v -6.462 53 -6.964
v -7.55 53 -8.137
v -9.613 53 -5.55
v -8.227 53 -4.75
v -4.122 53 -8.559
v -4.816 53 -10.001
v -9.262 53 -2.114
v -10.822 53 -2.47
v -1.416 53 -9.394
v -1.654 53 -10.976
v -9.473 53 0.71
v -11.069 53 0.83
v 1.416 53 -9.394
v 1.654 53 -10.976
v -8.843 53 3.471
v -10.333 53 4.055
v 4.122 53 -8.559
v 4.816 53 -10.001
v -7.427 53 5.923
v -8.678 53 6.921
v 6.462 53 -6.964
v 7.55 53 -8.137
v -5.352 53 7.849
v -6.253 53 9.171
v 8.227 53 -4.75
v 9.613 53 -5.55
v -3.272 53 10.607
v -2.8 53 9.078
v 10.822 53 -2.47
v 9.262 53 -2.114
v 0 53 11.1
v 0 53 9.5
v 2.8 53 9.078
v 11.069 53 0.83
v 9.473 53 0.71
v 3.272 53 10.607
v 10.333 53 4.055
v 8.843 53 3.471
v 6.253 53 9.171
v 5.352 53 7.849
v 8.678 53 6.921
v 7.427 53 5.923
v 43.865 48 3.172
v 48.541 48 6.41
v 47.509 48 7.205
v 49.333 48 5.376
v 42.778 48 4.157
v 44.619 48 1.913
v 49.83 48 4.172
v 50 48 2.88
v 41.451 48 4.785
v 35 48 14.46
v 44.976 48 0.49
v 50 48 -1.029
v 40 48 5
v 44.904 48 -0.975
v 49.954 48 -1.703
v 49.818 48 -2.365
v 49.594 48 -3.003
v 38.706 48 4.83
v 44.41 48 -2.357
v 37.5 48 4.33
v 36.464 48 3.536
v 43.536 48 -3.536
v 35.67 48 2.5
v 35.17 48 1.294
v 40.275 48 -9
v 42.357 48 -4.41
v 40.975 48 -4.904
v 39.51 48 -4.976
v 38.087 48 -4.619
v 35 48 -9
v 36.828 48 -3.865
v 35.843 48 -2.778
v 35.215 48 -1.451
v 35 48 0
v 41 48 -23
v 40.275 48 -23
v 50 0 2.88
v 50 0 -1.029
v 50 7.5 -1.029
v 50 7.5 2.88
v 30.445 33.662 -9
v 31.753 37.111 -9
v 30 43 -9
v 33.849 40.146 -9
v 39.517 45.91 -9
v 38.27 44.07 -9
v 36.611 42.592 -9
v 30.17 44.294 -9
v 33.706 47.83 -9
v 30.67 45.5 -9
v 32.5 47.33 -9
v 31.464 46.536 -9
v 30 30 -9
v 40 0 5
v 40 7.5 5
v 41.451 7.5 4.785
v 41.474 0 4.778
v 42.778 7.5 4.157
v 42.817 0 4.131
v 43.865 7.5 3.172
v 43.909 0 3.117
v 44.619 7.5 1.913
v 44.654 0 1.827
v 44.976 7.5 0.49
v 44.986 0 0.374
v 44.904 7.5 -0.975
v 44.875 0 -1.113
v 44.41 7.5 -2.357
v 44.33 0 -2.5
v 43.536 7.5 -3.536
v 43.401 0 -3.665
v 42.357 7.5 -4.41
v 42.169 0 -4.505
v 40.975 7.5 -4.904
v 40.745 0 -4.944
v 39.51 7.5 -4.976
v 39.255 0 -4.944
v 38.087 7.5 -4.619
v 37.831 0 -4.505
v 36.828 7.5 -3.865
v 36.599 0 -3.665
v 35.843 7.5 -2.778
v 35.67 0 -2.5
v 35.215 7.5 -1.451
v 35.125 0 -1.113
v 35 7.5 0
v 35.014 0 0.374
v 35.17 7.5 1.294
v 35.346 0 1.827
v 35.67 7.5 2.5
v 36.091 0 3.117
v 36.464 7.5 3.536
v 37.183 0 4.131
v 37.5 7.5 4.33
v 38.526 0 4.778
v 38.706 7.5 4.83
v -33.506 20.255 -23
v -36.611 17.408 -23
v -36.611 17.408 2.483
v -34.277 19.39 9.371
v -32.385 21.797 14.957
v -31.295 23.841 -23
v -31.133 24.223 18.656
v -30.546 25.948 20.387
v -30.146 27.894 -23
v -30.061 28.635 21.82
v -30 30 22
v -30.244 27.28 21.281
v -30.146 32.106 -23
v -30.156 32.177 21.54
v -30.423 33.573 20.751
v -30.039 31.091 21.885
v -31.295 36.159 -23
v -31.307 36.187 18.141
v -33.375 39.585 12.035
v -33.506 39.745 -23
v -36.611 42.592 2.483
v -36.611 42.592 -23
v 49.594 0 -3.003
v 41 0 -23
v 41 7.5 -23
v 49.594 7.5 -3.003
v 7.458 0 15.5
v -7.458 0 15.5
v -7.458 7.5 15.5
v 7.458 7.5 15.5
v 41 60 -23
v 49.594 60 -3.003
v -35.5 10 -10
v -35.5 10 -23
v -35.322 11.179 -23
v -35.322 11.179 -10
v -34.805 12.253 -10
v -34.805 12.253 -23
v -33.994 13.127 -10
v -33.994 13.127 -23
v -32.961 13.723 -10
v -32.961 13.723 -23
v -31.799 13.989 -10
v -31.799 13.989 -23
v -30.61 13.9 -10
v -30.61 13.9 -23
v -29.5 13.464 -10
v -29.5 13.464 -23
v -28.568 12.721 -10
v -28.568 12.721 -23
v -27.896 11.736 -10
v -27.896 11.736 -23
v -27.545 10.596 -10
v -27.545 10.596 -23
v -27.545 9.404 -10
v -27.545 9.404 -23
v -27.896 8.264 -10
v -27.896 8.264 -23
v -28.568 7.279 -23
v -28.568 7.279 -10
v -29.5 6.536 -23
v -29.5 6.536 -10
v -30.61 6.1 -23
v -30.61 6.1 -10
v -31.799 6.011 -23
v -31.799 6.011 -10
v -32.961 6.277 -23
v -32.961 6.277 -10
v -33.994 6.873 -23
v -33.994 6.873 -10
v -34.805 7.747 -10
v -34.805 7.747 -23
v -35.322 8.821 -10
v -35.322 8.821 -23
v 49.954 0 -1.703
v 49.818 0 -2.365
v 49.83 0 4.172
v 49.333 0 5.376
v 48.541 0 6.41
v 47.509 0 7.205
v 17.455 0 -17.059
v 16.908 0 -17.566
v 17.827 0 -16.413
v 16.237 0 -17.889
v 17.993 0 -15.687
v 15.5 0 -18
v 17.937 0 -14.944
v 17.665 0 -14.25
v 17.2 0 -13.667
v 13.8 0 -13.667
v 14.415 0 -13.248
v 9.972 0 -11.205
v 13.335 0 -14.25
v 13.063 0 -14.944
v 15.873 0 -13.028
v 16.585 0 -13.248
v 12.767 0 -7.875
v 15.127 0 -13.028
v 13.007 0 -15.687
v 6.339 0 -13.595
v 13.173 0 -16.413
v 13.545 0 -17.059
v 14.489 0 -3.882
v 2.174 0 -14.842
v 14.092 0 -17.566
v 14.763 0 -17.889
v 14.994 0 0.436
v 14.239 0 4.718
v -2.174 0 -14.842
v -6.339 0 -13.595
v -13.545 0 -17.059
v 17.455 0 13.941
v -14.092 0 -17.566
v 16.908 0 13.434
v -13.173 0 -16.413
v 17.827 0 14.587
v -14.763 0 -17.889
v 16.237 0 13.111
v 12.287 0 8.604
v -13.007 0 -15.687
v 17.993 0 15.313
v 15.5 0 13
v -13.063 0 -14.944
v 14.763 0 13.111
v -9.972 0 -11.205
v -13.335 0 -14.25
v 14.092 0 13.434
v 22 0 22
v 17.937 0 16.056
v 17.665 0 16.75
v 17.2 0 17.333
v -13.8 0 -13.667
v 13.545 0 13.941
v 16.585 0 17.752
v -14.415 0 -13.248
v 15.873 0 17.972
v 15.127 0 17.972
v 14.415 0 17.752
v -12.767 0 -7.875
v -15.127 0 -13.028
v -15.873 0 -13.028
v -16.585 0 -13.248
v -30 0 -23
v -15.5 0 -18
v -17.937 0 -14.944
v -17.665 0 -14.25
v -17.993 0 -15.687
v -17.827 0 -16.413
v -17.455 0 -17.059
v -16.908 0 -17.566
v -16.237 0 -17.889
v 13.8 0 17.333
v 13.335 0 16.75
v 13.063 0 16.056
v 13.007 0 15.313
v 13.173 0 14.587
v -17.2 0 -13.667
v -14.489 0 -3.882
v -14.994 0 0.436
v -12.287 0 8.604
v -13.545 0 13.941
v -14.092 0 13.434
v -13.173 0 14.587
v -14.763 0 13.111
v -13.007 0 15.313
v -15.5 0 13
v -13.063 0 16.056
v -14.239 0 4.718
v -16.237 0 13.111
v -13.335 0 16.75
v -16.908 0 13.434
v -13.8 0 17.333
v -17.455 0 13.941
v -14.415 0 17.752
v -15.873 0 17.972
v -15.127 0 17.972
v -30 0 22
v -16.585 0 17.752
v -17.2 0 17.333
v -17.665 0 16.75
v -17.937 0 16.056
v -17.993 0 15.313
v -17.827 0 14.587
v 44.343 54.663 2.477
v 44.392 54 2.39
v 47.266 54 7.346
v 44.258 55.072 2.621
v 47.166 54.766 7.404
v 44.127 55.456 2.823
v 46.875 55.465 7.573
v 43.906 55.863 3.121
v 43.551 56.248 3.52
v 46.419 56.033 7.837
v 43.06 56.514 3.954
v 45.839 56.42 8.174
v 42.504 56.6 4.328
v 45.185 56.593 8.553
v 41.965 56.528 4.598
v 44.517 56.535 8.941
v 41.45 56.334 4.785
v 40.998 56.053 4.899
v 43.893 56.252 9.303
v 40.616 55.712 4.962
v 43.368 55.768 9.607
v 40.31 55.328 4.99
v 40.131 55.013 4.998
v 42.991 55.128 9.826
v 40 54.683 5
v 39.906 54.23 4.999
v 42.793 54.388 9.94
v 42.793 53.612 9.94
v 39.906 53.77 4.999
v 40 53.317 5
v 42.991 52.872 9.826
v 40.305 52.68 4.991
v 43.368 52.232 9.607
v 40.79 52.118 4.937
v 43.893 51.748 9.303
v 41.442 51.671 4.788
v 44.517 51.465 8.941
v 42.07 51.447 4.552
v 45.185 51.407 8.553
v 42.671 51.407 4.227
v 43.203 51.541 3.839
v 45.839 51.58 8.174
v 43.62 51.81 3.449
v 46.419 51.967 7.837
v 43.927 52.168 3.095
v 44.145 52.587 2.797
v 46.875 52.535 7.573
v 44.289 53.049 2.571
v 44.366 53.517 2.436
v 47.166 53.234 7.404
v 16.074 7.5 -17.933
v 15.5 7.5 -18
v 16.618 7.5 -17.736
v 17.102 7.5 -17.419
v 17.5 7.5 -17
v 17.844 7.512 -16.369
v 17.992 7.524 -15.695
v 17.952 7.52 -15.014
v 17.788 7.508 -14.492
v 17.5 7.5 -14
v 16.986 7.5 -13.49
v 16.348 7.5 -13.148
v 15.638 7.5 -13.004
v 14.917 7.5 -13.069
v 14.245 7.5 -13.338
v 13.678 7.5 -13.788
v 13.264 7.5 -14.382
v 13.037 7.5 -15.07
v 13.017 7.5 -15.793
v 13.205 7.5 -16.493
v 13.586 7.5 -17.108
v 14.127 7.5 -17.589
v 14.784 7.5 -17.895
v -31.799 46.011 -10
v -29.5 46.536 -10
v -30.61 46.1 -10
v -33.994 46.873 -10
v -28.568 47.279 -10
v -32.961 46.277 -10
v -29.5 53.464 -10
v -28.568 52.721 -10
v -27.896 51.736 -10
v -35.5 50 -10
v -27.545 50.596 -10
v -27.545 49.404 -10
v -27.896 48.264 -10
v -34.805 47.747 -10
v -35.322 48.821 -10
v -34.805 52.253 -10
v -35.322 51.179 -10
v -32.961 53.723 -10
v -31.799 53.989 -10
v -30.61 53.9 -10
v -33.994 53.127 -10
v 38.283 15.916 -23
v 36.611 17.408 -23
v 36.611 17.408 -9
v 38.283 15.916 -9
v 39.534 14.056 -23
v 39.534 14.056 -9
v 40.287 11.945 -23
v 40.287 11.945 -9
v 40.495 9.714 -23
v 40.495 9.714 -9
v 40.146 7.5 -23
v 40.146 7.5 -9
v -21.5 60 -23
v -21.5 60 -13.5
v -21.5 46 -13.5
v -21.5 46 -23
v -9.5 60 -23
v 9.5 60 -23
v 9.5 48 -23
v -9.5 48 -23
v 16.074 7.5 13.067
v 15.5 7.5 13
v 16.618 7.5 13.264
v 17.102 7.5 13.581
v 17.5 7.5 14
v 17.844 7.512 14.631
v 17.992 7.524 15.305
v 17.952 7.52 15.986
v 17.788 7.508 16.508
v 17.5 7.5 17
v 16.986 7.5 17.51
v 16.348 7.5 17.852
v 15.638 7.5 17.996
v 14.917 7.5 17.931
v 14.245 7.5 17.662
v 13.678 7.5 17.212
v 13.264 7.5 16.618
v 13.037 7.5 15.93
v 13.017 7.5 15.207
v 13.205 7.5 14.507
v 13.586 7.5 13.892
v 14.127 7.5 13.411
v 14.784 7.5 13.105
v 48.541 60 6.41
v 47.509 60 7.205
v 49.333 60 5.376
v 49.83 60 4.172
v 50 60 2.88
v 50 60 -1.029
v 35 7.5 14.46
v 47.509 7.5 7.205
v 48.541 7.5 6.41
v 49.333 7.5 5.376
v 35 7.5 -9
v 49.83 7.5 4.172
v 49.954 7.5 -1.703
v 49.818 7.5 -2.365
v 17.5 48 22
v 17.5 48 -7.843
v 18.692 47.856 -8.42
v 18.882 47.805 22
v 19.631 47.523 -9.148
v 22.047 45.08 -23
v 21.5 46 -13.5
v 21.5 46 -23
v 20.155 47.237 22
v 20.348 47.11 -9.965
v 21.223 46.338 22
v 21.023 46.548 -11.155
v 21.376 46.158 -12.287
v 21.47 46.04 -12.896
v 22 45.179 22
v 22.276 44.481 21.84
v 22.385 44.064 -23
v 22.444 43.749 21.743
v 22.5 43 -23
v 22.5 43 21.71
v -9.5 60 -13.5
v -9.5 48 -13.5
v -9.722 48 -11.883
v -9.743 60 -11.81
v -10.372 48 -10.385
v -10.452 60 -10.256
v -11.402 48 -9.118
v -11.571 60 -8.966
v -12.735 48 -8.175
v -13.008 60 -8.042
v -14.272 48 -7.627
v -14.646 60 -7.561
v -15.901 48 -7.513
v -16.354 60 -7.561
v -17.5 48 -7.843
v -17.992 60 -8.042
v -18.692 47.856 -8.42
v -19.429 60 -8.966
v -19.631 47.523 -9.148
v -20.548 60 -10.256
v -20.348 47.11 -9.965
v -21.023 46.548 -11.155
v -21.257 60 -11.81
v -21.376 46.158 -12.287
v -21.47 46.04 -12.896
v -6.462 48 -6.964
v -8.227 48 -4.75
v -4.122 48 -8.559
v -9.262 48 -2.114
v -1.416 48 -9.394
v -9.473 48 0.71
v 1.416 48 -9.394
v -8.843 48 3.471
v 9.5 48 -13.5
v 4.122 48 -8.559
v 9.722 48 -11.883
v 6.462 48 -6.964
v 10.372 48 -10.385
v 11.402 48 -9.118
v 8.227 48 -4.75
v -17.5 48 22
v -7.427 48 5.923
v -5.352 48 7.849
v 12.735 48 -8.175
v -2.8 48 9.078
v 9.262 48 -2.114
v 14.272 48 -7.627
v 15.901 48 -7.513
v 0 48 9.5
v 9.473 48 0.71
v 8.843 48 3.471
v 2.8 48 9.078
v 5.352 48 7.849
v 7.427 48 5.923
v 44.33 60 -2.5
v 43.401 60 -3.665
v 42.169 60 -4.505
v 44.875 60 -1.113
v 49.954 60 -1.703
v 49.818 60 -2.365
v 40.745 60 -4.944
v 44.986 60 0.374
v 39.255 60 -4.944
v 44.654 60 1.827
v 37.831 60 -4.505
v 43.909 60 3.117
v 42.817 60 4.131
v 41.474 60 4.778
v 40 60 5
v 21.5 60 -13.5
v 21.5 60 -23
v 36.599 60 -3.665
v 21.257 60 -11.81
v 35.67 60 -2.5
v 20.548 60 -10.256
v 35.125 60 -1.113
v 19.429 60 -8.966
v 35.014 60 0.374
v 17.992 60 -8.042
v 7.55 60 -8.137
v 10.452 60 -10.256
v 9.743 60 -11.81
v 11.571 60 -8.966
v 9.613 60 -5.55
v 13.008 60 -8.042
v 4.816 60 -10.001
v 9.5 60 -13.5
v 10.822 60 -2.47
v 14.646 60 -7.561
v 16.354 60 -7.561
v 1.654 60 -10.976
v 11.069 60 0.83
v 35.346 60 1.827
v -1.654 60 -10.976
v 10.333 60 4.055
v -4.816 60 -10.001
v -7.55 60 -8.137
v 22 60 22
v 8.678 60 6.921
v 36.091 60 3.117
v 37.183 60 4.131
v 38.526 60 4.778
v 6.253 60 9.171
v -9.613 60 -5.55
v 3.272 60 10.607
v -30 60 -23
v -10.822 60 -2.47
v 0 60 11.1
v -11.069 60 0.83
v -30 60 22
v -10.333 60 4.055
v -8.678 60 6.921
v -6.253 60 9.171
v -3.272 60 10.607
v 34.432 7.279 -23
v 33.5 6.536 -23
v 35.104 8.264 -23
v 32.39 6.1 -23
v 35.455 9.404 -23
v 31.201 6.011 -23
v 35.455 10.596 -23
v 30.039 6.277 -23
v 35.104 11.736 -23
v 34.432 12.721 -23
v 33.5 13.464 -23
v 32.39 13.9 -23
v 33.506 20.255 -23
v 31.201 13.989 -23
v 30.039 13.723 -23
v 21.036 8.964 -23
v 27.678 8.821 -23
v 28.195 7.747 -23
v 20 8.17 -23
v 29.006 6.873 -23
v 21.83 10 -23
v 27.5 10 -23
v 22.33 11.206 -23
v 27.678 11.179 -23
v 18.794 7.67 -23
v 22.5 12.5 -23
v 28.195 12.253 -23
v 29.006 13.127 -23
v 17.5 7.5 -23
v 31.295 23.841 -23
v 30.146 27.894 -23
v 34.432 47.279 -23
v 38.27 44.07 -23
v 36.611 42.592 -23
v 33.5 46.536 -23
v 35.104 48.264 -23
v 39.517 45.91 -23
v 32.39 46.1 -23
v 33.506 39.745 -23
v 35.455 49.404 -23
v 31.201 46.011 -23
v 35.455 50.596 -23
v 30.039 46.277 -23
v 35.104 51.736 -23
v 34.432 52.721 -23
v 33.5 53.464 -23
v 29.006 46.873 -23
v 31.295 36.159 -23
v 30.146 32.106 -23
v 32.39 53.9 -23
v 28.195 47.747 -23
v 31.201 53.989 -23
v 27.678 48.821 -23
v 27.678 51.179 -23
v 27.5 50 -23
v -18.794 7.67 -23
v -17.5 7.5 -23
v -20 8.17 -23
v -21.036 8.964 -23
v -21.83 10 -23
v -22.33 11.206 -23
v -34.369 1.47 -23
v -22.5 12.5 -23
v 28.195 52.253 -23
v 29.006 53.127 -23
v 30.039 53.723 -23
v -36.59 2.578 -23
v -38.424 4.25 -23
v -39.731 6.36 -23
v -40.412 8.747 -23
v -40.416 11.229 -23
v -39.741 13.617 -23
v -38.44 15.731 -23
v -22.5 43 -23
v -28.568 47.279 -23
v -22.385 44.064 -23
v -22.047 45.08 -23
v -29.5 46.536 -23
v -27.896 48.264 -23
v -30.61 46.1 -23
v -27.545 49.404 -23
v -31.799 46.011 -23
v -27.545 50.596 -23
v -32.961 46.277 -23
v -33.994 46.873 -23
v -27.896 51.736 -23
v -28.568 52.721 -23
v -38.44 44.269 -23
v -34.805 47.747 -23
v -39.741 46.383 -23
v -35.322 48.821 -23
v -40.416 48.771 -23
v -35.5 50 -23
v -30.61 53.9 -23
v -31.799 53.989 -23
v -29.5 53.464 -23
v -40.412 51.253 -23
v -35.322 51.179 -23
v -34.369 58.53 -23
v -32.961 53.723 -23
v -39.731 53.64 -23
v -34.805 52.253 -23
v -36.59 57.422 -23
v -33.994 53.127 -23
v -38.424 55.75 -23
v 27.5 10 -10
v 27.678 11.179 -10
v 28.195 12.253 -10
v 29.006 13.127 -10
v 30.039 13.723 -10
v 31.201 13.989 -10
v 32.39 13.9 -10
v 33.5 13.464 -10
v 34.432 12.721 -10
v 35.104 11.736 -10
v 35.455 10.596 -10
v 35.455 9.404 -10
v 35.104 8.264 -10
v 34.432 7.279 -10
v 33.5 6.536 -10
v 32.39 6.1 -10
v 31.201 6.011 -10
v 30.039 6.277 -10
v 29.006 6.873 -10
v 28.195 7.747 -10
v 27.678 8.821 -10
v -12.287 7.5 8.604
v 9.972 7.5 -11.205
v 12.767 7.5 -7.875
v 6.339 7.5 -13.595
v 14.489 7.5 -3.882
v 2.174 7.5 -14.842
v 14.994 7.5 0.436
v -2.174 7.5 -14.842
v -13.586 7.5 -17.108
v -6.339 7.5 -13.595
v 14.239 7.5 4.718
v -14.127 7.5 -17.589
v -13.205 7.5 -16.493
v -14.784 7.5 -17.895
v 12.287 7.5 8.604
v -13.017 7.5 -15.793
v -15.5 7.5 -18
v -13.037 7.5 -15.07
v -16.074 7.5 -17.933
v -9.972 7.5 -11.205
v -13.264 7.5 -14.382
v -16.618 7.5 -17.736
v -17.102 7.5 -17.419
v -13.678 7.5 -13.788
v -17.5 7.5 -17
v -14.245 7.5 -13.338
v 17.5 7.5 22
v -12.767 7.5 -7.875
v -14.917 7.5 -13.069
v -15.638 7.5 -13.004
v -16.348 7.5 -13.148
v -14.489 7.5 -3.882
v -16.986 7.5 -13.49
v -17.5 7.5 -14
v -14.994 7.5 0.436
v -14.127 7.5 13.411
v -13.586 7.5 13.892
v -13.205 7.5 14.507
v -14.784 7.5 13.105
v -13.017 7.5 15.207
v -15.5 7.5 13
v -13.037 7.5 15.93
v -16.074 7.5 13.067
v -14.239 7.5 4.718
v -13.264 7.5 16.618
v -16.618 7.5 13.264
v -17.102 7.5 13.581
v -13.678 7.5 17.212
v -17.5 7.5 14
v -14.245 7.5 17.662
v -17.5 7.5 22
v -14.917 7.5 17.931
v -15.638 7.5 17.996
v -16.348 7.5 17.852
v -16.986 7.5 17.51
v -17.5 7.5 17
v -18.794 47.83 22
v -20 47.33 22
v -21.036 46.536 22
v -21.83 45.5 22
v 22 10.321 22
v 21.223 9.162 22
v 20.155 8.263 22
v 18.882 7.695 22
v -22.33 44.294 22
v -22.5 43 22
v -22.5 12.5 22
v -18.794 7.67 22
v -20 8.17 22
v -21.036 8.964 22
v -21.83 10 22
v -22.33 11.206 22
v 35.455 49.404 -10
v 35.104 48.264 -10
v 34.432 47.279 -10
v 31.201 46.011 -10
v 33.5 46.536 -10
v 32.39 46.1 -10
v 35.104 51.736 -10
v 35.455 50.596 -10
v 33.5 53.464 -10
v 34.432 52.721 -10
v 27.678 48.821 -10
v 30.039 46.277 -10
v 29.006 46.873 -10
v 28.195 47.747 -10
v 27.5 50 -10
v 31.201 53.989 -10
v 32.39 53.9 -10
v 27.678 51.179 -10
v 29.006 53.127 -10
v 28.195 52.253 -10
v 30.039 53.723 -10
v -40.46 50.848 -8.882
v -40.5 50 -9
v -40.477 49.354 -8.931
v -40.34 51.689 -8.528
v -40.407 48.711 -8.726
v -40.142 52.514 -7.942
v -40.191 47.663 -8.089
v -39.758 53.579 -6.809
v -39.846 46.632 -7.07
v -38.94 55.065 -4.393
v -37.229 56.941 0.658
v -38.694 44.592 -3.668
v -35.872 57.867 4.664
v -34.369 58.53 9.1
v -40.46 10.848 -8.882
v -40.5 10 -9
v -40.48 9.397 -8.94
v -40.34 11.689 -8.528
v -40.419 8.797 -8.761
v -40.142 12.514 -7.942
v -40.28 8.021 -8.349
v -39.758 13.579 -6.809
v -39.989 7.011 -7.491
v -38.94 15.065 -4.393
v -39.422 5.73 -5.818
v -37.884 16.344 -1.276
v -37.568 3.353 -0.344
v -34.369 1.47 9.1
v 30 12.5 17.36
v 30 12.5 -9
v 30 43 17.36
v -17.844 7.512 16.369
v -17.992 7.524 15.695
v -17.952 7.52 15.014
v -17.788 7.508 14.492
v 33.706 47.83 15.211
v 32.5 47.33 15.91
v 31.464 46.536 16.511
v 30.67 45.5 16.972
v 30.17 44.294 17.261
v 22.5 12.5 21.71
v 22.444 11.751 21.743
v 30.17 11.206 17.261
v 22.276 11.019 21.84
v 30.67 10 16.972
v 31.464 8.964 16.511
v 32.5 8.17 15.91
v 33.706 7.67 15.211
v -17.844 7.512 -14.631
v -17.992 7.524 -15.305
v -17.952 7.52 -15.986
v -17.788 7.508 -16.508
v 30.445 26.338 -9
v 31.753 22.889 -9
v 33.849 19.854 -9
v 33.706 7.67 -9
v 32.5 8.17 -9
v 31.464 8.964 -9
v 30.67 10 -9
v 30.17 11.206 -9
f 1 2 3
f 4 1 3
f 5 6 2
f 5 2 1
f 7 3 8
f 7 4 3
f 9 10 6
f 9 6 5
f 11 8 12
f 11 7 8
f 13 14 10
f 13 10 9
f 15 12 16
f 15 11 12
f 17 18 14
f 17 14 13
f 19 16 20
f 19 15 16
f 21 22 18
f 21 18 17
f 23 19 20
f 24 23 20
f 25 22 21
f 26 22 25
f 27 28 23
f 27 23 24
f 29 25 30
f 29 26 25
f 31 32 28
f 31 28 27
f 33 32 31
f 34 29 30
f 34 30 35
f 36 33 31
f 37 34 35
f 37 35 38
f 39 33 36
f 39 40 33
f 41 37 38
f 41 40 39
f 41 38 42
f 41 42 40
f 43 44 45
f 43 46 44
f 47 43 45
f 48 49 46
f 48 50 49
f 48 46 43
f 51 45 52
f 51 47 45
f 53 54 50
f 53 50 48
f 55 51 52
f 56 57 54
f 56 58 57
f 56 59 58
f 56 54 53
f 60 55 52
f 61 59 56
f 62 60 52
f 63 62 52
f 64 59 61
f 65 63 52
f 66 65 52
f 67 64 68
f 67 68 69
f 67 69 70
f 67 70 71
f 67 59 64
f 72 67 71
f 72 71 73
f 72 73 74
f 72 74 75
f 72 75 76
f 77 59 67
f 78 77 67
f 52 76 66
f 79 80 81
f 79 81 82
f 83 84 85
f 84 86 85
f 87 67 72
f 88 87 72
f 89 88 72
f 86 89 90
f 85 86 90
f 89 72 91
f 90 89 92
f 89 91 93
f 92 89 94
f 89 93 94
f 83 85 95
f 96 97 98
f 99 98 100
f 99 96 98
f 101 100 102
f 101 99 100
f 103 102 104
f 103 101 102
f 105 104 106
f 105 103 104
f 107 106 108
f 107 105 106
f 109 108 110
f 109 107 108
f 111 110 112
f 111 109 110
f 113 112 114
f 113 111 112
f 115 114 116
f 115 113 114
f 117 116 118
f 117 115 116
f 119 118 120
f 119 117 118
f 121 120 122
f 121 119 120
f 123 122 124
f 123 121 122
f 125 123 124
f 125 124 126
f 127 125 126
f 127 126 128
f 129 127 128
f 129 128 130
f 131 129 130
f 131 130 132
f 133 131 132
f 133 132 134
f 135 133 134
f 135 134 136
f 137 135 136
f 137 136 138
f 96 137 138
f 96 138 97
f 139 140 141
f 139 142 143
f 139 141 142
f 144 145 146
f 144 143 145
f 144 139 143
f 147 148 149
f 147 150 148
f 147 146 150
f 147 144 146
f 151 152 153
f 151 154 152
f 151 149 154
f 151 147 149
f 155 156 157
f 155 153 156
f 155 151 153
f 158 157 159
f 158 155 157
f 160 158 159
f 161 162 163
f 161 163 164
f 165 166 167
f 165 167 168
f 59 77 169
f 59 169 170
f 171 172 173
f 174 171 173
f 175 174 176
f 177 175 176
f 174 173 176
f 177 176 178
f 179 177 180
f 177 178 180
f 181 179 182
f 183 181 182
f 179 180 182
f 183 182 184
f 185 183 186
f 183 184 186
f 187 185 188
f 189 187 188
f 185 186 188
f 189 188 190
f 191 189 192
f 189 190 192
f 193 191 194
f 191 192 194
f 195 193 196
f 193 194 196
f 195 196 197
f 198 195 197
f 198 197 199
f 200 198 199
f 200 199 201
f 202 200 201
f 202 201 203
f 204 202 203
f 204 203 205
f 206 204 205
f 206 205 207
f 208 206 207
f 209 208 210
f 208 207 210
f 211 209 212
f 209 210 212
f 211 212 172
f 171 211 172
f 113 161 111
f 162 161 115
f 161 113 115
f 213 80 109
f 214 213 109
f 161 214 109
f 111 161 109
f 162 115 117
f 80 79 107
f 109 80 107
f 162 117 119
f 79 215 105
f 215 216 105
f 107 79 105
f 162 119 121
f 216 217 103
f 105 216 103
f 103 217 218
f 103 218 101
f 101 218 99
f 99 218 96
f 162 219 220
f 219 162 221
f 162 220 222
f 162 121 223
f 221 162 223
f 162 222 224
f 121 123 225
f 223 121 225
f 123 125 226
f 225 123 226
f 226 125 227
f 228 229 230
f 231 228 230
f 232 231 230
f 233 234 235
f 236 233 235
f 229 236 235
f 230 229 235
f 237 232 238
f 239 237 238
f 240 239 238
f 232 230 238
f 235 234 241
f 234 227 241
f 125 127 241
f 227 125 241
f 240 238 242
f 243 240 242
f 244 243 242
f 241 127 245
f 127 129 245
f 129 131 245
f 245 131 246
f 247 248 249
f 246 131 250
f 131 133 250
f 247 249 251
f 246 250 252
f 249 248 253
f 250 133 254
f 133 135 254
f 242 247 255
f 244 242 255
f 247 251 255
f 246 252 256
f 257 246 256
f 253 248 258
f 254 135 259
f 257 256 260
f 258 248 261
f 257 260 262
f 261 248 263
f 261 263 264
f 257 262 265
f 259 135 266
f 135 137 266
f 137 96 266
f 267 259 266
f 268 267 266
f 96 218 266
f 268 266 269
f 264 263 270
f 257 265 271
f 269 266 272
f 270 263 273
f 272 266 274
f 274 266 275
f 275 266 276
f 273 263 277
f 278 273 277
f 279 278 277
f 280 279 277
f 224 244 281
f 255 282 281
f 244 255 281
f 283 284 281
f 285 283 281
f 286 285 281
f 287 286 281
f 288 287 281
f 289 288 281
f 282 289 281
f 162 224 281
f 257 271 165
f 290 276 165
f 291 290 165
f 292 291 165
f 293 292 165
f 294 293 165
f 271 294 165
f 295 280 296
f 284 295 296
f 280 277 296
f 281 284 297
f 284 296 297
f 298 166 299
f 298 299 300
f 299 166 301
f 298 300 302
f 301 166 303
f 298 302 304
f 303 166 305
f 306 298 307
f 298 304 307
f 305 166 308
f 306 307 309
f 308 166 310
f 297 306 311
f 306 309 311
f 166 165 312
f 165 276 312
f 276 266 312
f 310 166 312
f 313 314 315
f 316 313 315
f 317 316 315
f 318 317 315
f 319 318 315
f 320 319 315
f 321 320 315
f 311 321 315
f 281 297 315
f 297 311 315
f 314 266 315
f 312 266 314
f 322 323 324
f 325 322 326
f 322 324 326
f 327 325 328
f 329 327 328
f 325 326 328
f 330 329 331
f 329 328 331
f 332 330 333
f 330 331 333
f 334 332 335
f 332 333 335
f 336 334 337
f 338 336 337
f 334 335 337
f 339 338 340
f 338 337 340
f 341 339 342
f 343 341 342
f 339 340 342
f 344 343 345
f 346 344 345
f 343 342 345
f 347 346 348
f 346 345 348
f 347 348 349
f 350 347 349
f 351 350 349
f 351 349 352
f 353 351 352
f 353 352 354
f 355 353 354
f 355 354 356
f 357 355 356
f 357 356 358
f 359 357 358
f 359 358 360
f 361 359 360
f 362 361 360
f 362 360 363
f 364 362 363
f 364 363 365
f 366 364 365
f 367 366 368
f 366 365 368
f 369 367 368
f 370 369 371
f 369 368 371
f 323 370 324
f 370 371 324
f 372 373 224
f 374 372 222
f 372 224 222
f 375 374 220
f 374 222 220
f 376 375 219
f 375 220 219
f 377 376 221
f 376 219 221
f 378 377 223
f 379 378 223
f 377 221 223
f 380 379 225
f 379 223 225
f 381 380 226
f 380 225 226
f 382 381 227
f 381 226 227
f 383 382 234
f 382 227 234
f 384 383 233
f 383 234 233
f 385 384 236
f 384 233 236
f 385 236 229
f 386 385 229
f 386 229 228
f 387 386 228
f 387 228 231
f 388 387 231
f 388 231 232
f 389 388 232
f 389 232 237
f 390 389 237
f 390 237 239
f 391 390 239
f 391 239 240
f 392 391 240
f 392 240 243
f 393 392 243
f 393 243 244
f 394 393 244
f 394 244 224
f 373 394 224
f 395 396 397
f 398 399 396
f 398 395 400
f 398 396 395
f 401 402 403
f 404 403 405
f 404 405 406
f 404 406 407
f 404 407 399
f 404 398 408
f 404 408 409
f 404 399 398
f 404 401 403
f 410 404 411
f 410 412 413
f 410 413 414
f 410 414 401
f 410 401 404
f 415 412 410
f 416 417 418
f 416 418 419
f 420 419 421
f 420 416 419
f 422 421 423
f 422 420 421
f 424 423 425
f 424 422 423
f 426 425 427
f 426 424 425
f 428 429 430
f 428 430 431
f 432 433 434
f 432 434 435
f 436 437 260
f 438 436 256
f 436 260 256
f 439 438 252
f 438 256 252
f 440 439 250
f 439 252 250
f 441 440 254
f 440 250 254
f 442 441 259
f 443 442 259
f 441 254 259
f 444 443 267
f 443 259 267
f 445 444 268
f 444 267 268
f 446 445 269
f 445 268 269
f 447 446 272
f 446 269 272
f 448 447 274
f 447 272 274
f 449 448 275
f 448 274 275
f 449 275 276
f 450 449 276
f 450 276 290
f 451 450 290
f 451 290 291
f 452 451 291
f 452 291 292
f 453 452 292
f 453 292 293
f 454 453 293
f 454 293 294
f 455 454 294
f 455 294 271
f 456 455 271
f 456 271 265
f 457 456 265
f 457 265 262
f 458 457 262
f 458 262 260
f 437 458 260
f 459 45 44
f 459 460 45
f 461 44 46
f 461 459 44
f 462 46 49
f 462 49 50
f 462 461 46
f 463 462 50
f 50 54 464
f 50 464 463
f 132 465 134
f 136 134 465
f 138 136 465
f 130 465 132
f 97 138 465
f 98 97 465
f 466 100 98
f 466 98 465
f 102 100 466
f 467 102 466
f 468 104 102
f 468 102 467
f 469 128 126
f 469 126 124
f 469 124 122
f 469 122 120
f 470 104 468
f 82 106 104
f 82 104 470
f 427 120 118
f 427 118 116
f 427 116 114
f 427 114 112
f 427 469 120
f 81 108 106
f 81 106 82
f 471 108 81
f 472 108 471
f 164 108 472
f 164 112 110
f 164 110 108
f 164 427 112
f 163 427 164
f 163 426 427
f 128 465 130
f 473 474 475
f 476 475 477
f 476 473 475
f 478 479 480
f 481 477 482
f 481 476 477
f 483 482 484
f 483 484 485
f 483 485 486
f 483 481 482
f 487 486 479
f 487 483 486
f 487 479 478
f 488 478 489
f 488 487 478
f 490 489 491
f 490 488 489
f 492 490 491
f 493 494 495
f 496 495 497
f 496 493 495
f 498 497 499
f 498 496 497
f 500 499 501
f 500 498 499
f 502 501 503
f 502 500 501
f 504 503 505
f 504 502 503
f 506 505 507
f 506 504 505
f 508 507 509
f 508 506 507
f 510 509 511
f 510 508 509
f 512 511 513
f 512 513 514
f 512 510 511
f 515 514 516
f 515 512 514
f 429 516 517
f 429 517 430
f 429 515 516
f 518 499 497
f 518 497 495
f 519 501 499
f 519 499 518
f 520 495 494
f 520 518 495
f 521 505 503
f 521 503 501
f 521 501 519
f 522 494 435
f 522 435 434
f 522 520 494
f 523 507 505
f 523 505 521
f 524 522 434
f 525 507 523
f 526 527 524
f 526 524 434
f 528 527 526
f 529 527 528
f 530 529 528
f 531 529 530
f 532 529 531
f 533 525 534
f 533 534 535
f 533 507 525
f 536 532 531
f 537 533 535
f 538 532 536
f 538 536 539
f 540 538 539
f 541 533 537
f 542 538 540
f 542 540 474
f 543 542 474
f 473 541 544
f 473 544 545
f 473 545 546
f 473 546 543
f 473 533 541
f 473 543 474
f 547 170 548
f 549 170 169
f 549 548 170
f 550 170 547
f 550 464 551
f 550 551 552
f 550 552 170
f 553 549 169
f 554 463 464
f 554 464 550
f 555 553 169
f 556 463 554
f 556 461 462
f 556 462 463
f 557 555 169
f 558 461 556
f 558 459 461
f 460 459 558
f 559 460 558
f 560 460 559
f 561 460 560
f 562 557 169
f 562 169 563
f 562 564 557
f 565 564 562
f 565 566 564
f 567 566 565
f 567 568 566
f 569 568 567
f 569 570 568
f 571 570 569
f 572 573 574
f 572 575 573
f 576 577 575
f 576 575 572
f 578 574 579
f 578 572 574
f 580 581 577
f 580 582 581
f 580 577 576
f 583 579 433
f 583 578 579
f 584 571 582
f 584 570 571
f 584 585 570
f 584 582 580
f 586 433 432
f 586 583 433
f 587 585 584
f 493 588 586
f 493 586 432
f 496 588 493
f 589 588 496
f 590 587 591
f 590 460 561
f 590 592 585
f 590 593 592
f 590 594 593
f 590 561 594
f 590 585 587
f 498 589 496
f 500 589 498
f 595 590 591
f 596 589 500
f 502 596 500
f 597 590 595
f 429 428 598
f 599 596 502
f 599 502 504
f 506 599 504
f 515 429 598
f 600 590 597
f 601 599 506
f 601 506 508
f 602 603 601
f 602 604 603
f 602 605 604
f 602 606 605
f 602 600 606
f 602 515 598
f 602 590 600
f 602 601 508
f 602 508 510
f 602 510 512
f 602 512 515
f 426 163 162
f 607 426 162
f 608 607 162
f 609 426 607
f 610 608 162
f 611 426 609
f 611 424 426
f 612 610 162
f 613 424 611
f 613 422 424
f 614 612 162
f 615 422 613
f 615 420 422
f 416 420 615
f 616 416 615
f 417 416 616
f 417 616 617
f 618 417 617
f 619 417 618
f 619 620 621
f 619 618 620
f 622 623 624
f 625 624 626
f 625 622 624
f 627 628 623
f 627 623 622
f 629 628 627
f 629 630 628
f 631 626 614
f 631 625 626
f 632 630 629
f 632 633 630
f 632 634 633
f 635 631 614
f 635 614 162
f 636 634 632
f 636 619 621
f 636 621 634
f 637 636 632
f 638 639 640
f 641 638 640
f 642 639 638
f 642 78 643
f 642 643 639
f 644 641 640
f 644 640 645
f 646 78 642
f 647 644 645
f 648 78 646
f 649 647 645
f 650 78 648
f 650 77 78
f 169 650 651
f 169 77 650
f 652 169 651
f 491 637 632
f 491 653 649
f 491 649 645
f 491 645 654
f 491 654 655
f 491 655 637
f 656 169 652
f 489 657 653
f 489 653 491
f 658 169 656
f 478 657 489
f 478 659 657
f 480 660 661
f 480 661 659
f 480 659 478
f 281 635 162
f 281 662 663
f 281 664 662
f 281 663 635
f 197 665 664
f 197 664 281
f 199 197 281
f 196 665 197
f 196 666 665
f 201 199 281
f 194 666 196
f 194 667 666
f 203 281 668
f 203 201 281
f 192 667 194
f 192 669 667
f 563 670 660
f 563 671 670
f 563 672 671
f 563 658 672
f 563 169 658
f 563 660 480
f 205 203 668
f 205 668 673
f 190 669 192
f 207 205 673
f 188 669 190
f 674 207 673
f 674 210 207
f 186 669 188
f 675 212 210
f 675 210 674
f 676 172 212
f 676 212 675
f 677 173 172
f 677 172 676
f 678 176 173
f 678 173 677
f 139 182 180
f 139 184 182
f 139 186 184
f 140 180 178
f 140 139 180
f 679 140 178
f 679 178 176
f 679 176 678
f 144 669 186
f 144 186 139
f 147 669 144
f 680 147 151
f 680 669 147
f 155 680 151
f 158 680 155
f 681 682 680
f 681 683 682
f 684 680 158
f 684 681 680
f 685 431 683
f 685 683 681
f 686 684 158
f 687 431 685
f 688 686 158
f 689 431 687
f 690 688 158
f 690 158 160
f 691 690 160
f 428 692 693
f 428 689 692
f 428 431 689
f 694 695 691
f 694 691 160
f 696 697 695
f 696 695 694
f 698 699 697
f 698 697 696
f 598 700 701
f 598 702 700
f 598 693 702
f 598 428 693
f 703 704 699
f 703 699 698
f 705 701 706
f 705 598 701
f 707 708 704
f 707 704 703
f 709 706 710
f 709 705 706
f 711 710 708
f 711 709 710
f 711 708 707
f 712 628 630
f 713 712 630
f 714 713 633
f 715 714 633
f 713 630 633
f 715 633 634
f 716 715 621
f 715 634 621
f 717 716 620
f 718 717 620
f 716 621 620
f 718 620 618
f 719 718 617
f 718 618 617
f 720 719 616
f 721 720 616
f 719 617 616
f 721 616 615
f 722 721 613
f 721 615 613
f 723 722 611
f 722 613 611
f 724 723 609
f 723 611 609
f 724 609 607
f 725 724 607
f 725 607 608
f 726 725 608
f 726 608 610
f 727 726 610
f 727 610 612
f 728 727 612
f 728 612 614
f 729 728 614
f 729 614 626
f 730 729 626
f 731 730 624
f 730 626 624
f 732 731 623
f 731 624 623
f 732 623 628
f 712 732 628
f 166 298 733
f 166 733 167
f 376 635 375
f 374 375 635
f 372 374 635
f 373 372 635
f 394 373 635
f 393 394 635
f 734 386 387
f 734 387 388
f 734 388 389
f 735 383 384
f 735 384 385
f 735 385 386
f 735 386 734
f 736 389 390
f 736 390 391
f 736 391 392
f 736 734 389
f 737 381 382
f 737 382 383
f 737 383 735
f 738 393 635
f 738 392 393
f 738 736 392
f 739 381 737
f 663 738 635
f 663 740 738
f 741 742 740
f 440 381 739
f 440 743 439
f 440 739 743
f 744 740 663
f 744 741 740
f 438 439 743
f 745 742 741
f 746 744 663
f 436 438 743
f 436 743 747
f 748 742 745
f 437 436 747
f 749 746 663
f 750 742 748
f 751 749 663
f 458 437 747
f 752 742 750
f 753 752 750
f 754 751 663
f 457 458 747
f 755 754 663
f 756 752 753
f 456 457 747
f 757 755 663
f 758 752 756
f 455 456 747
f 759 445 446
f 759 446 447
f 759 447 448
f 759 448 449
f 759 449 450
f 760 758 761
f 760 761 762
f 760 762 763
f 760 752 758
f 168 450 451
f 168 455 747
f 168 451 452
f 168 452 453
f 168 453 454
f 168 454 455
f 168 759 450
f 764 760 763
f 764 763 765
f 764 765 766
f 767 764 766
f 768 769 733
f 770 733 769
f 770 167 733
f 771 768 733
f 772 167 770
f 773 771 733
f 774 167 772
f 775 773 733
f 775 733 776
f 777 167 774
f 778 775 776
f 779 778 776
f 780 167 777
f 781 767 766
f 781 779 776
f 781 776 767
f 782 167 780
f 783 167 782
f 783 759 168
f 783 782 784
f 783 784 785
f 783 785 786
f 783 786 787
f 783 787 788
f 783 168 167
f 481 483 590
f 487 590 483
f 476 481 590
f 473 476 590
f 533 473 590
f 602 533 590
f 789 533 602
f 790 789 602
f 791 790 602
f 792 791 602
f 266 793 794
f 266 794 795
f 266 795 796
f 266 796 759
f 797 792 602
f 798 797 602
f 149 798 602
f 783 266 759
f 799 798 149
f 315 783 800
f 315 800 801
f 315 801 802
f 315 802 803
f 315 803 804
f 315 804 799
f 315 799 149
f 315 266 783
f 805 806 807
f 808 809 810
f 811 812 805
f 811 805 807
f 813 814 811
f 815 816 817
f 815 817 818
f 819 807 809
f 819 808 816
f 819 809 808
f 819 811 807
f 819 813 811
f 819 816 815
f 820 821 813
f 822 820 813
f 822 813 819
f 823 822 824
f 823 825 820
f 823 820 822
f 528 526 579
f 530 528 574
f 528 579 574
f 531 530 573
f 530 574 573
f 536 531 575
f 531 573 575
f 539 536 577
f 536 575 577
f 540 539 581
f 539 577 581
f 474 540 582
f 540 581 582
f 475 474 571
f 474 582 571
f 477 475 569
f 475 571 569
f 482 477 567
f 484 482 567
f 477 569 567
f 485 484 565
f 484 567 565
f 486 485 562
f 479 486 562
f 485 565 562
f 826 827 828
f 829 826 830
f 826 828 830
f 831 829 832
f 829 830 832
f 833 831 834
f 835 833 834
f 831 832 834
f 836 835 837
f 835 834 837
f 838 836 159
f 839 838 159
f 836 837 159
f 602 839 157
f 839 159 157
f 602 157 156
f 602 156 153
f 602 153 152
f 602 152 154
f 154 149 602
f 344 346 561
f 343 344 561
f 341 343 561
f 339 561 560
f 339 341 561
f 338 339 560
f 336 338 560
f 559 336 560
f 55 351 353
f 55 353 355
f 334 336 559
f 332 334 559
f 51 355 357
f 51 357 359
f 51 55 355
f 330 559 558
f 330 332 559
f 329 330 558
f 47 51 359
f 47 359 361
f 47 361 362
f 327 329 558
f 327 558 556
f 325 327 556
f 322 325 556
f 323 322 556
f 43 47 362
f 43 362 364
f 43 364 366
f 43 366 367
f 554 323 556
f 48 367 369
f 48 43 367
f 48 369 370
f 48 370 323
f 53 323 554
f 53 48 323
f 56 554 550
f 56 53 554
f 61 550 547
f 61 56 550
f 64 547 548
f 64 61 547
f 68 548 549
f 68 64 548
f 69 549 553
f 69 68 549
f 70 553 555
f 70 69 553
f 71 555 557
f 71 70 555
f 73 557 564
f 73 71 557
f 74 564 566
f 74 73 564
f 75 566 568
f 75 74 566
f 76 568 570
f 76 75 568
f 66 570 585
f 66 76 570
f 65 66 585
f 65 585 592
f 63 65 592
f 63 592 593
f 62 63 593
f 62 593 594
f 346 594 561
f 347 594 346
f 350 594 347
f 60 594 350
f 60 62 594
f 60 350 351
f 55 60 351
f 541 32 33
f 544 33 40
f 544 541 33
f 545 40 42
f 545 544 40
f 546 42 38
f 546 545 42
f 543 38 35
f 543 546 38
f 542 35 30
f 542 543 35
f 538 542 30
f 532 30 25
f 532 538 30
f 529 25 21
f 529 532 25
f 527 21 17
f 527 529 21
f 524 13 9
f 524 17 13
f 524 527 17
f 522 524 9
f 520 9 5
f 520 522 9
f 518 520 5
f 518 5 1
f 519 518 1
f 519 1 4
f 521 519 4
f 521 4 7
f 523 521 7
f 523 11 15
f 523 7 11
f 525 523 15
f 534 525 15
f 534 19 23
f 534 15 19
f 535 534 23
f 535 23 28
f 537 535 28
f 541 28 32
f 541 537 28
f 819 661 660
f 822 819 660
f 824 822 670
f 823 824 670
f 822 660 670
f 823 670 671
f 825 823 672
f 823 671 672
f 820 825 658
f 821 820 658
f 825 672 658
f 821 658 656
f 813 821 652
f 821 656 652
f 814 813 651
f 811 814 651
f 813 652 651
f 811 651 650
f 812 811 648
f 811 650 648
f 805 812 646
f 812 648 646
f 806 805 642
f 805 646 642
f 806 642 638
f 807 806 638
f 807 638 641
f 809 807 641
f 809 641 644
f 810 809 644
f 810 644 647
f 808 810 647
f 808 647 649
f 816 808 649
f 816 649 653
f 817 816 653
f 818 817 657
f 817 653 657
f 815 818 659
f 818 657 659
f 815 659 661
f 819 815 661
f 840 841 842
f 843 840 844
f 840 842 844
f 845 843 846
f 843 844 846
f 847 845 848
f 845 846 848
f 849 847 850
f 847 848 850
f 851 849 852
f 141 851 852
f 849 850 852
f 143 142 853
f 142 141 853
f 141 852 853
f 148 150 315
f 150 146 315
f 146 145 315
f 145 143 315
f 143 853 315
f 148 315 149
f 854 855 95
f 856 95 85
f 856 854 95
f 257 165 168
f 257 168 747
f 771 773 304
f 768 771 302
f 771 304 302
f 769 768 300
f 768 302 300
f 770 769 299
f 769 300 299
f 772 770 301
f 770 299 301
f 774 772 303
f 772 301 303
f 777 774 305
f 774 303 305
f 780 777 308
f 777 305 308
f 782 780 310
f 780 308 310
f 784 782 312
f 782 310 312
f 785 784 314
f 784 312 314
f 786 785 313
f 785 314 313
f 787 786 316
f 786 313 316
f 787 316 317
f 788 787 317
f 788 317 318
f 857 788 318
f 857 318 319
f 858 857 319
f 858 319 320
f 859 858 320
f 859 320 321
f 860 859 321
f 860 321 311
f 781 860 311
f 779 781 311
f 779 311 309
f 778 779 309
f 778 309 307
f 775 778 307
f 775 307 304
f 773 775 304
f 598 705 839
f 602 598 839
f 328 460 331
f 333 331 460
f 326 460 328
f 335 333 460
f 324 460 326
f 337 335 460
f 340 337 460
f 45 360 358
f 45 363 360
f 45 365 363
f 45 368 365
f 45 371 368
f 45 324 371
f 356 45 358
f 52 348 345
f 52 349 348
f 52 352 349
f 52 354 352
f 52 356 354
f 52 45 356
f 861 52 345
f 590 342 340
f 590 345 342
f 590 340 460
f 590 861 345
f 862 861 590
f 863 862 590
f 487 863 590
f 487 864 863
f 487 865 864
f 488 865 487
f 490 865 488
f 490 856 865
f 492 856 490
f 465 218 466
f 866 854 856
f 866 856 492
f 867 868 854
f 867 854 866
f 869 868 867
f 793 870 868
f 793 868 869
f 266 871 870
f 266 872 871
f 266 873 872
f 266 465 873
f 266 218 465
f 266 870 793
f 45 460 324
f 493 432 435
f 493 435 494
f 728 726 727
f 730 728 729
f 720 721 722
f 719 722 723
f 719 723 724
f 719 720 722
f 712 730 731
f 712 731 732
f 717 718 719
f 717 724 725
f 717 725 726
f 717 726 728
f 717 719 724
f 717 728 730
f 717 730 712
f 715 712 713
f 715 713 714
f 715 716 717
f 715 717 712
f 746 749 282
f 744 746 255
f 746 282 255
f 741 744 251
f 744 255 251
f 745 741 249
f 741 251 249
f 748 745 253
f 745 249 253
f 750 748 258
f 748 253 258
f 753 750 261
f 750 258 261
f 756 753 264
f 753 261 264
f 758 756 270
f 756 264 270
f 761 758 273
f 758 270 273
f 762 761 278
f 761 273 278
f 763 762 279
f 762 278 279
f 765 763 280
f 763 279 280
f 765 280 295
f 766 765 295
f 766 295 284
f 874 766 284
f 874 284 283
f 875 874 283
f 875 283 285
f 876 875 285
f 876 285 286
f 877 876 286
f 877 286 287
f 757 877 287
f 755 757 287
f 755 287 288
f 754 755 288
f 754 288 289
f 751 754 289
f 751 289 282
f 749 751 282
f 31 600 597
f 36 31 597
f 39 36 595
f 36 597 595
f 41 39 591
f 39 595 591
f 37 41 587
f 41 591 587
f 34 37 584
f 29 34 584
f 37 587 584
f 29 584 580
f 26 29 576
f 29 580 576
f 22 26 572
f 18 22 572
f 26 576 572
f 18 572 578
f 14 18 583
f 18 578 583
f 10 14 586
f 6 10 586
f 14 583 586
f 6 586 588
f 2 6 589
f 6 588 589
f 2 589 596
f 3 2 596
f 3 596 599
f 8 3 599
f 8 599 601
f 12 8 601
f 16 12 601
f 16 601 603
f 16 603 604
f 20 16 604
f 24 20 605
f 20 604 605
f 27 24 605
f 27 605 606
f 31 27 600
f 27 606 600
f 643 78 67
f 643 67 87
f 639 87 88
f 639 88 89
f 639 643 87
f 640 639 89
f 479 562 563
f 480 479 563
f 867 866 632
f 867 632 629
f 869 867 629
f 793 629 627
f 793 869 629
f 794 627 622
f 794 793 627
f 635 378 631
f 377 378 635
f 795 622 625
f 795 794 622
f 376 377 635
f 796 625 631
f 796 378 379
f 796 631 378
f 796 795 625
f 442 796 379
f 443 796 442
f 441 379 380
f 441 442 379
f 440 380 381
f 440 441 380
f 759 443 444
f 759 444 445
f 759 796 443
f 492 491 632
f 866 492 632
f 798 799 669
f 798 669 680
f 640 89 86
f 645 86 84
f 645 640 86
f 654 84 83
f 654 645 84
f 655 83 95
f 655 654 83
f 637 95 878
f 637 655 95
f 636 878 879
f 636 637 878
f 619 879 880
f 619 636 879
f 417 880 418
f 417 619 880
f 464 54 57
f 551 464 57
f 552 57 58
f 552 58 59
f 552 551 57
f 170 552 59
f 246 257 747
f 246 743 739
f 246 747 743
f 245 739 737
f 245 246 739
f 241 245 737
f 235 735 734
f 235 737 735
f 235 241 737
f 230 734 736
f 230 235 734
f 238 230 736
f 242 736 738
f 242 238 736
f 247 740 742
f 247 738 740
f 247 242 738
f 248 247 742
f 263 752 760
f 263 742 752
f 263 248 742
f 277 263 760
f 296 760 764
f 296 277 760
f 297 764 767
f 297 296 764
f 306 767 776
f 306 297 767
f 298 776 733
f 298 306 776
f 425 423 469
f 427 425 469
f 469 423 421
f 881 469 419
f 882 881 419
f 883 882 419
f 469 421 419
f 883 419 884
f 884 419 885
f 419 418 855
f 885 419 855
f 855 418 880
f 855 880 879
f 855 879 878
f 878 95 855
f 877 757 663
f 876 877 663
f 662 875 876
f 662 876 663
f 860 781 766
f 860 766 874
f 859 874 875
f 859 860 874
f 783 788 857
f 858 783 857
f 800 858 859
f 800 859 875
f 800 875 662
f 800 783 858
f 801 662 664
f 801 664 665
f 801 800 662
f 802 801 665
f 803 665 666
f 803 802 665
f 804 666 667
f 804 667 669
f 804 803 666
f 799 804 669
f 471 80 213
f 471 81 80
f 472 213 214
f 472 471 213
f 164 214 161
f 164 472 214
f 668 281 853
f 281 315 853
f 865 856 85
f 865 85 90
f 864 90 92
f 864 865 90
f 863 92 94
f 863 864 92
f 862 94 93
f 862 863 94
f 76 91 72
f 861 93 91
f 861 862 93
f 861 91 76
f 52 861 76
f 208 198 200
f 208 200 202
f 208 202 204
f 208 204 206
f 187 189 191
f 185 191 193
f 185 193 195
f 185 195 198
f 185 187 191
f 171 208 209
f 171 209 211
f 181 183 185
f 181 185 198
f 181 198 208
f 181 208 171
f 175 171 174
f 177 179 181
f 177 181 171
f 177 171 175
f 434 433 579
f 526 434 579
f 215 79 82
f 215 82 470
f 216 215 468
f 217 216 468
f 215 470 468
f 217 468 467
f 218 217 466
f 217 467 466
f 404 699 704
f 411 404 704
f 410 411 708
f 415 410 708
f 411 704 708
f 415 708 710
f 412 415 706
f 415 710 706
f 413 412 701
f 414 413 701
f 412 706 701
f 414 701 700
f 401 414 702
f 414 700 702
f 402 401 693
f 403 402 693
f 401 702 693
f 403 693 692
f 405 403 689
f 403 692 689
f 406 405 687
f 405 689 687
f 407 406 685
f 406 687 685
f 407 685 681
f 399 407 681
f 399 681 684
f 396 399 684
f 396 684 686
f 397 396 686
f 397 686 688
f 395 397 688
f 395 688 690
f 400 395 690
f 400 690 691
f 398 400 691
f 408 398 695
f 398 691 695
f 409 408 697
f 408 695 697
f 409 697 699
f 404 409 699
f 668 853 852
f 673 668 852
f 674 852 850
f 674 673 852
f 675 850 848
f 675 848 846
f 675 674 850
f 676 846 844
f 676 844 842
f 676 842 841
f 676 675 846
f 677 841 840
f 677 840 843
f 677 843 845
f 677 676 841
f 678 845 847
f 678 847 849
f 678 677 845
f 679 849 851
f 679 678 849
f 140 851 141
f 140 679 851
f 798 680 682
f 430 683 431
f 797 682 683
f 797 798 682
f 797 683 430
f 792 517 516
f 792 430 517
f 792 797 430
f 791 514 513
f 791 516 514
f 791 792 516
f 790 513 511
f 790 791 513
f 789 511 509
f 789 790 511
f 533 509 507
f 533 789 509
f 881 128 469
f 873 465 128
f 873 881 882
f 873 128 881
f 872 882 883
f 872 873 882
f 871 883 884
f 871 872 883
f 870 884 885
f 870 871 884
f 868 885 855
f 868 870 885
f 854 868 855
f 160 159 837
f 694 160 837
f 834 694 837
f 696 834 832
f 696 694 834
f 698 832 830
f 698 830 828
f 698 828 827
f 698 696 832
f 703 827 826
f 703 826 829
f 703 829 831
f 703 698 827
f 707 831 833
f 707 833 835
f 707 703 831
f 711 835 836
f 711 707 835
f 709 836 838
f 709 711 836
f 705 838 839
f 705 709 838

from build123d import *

# Parameters (mm, degrees)
SKETCH1_R           = 9.5
SKETCH1_R_2         = 5
BOSS_EXTRUDE1_DEPTH = 60
SKETCH2_R           = 11.1
CUT_EXTRUDE1_DEPTH  = 7
CUT_EXTRUDE2_DEPTH  = 31
SKETCH4_R           = 2.5
CUT_EXTRUDE3_DEPTH  = 16
SKETCH7_W           = 10.5
SKETCH7_H           = 60
BOSS_EXTRUDE2_DEPTH = 14
BOSS_EXTRUDE3_DEPTH = 60
SKETCH5_R           = 4
CUT_EXTRUDE4_DEPTH  = 13
CUT_EXTRUDE5_DEPTH  = 46.0000001
FILLET1_R           = 5
SKETCH9_R           = 2.6
CUT_EXTRUDE6_DEPTH  = 10
CUT_EXTRUDE7_DEPTH  = 20


with BuildPart() as part:
    # Sketch1 → Boss-Extrude1 (new body)
    with BuildSketch(Plane(origin=(0, 0, 0), x_dir=(1, 0, 0), z_dir=(0, 1, 0))):
        Polygon((-30, 23), (41, 23), (50, 2.057780588), (50, -5.760336739), (22, -22), (-30, -22), align=None)
        with Locations(Location((0, 0, 0), (0, 0, 270))):  # turned: the seam where the file's is
            Circle(SKETCH1_R, mode=Mode.SUBTRACT)
        with Locations(Location((40, 0, 0), (0, 0, 270))):  # turned: the seam where the file's is
            Circle(SKETCH1_R_2, mode=Mode.SUBTRACT)
    extrude(amount=BOSS_EXTRUDE1_DEPTH)

    # Sketch2 → Cut-Extrude1 (cut)
    with BuildSketch(Plane(origin=(0, 60, 0), x_dir=(1, 0, 0), z_dir=(0, 1, 0))):
        with Locations(Location((0, 0, 0), (0, 0, 270))):  # turned: the seam where the file's is
            Circle(SKETCH2_R)
    extrude(amount=-CUT_EXTRUDE1_DEPTH, mode=Mode.SUBTRACT)

    # Sketch3 → Cut-Extrude2 (cut)
    with BuildSketch(Plane.XY.offset(22)):
        with BuildLine():
            Line((-17.5, 48), (17.5, 48))
            ThreePointArc((17.5, 48), (21.035533906, 46.535533906), (22.5, 43))
            Line((22.5, 43), (22.5, 12.5))
            ThreePointArc((22.5, 12.5), (21.035533906, 8.964466094), (17.5, 7.5))
            Line((17.5, 7.5), (-17.5, 7.5))
            ThreePointArc((-17.5, 7.5), (-21.035533906, 8.964466094), (-22.5, 12.5))
            Line((-22.5, 12.5), (-22.5, 43))
            ThreePointArc((-22.5, 43), (-21.035533906, 46.535533906), (-17.5, 48))
        make_face()
        with BuildLine():
            Line((35, 48), (66.370981508, 48))
            Line((66.370981508, 48), (66.370981508, 7.5))
            Line((66.370981508, 7.5), (35, 7.5))
            ThreePointArc((35, 7.5), (31.464466094, 8.964466094), (30, 12.5))
            Line((30, 12.5), (30, 43))
            ThreePointArc((30, 43), (31.464466094, 46.535533906), (35, 48))
        make_face()
    extrude(amount=-CUT_EXTRUDE2_DEPTH, mode=Mode.SUBTRACT)

    # Sketch4 → Cut-Extrude3 (cut)
    with BuildSketch(Plane.XZ):
        with Locations(Location((15.5, 15.5, 0), (0, 0, 270))):  # turned: the seam where the file's is
            Circle(SKETCH4_R)
        with Locations(Location((-15.5, 15.5, 0), (0, 0, 270))):  # turned: the seam where the file's is
            Circle(SKETCH4_R)
        with Locations(Location((-15.5, -15.5, 0), (0, 0, 270))):  # turned: the seam where the file's is
            Circle(SKETCH4_R)
        with Locations(Location((15.5, -15.5, 0), (0, 0, 270))):  # turned: the seam where the file's is
            Circle(SKETCH4_R)
        with BuildLine():
            Line((-12.287280664, 8.603646545), (-7.458401989, 15.5))
            Line((-7.458401989, 15.5), (7.458401989, 15.5))
            Line((7.458401989, 15.5), (12.287280664, 8.603646545))
            ThreePointArc((12.287280664, 8.603646545), (0, -15), (-12.287280664, 8.603646545))
        make_face()
    extrude(amount=-CUT_EXTRUDE3_DEPTH, mode=Mode.SUBTRACT)

    # Sketch7 → Boss-Extrude2 (add)
    with BuildSketch(Plane(origin=(0, 0, -23), x_dir=(-1, 0, 0), z_dir=(0, 0, -1))):
        with Locations((35.25, 30)):
            Rectangle(SKETCH7_W, SKETCH7_H)
    extrude(amount=-BOSS_EXTRUDE2_DEPTH)

    # Sketch8 → Boss-Extrude3 (add)
    with BuildSketch(Plane.XZ):
        Polygon((-40.5, -9), (-30, 22), (-30, -9), align=None)
    extrude(amount=-BOSS_EXTRUDE3_DEPTH)

    # Sketch5 → Cut-Extrude4 (cut)
    with BuildSketch(Plane(origin=(0, 0, -23), x_dir=(-1, 0, 0), z_dir=(0, 0, -1))):
        with Locations((31.5, 50)):
            Circle(SKETCH5_R)
        with Locations((31.5, 10)):
            Circle(SKETCH5_R)
        with Locations((-31.5, 10)):
            Circle(SKETCH5_R)
        with Locations((-31.5, 50)):
            Circle(SKETCH5_R)
    extrude(amount=-CUT_EXTRUDE4_DEPTH, mode=Mode.SUBTRACT)

    # Sketch6 → Cut-Extrude5 (cut, through all)
    with BuildSketch(Plane(origin=(0, 0, -23), x_dir=(-1, 0, 0), z_dir=(0, 0, -1))):
        with BuildLine():
            Line((17.5, 48), (-17.5, 48))
            ThreePointArc((-17.5, 48), (-21.035533906, 46.535533906), (-22.5, 43))
            Line((-22.5, 43), (-22.5, 12.5))
            ThreePointArc((-22.5, 12.5), (-21.035533906, 8.964466094), (-17.5, 7.5))
            Line((-17.5, 7.5), (17.5, 7.5))
            ThreePointArc((17.5, 7.5), (21.035533906, 8.964466094), (22.5, 12.5))
            Line((22.5, 12.5), (22.5, 43))
            ThreePointArc((22.5, 43), (21.035533906, 46.535533906), (17.5, 48))
        make_face()
        with BuildLine():
            Line((34.369237169, 58.530385575), (30, 60))
            Line((30, 60), (30, 65.619685256))
            Line((30, 65.619685256), (48.74877155, 65.619685256))
            Line((48.74877155, 65.619685256), (48.74877155, -4.23456535))
            Line((48.74877155, -4.23456535), (30, -4.23456535))
            Line((30, -4.23456535), (30, 0))
            Line((30, 0), (34.369237169, 1.469614425))
            ThreePointArc((34.369237169, 1.469614425), (40.412298518, 8.746630491), (36.610730034, 17.408133268))
            ThreePointArc((36.610730034, 17.408133268), (30, 30), (36.610730034, 42.591866732))
            ThreePointArc((36.610730034, 42.591866732), (40.412298518, 51.253369509), (34.369237169, 58.530385575))
        make_face()
        with BuildLine():
            Line((-50, 48), (-40.274964387, 48))
            ThreePointArc((-40.274964387, 48), (-38.950845842, 44.951743247), (-36.610730034, 42.591866732))
            ThreePointArc((-36.610730034, 42.591866732), (-30, 30), (-36.610730034, 17.408133268))
            ThreePointArc((-36.610730034, 17.408133268), (-39.976636272, 13.024340839), (-40.145808233, 7.5))
            Line((-40.145808233, 7.5), (-50, 7.5))
            Line((-50, 7.5), (-50, 48))
        make_face()
    extrude(amount=-CUT_EXTRUDE5_DEPTH, mode=Mode.SUBTRACT)

    # Fillet1
    fillet1_edges = [part.edges().sort_by_distance(p)[0] for p in [
        (50, 54, -2.057780588),
        (50, 54, 5.760336739),
        (50, 3.75, -2.057780588),
        (50, 3.75, 5.760336739),
    ]]
    fillet(fillet1_edges, radius=FILLET1_R)

    # Sketch9 → Cut-Extrude6 (cut)
    with BuildSketch(Plane(origin=(15.085632266, 0, 26.010250131), x_dir=(0.865035704, 0, -0.501710305), z_dir=(0.501710305, 0, 0.865035704))):
        with Locations((34.60142817, 54)):
            Circle(SKETCH9_R)
    extrude(amount=-CUT_EXTRUDE6_DEPTH, mode=Mode.SUBTRACT)

    # Sketch10 → Cut-Extrude7 (cut)
    with BuildSketch(Plane(origin=(0, 60, 0), x_dir=(1, 0, 0), z_dir=(0, 1, 0))):
        with BuildLine():
            Line((21.5, 23), (9.5, 23))
            Line((9.5, 23), (9.5, 13.5))
            ThreePointArc((9.5, 13.5), (15.5, 7.5), (21.5, 13.5))
            Line((21.5, 13.5), (21.5, 23))
        make_face()
        with BuildLine():
            Line((-21.5, 13.5), (-21.5, 23))
            Line((-21.5, 23), (-9.5, 23))
            Line((-9.5, 23), (-9.5, 13.5))
            ThreePointArc((-9.5, 13.5), (-15.5, 7.5), (-21.5, 13.5))
        make_face()
    extrude(amount=-CUT_EXTRUDE7_DEPTH, mode=Mode.SUBTRACT)


solid = part.part
